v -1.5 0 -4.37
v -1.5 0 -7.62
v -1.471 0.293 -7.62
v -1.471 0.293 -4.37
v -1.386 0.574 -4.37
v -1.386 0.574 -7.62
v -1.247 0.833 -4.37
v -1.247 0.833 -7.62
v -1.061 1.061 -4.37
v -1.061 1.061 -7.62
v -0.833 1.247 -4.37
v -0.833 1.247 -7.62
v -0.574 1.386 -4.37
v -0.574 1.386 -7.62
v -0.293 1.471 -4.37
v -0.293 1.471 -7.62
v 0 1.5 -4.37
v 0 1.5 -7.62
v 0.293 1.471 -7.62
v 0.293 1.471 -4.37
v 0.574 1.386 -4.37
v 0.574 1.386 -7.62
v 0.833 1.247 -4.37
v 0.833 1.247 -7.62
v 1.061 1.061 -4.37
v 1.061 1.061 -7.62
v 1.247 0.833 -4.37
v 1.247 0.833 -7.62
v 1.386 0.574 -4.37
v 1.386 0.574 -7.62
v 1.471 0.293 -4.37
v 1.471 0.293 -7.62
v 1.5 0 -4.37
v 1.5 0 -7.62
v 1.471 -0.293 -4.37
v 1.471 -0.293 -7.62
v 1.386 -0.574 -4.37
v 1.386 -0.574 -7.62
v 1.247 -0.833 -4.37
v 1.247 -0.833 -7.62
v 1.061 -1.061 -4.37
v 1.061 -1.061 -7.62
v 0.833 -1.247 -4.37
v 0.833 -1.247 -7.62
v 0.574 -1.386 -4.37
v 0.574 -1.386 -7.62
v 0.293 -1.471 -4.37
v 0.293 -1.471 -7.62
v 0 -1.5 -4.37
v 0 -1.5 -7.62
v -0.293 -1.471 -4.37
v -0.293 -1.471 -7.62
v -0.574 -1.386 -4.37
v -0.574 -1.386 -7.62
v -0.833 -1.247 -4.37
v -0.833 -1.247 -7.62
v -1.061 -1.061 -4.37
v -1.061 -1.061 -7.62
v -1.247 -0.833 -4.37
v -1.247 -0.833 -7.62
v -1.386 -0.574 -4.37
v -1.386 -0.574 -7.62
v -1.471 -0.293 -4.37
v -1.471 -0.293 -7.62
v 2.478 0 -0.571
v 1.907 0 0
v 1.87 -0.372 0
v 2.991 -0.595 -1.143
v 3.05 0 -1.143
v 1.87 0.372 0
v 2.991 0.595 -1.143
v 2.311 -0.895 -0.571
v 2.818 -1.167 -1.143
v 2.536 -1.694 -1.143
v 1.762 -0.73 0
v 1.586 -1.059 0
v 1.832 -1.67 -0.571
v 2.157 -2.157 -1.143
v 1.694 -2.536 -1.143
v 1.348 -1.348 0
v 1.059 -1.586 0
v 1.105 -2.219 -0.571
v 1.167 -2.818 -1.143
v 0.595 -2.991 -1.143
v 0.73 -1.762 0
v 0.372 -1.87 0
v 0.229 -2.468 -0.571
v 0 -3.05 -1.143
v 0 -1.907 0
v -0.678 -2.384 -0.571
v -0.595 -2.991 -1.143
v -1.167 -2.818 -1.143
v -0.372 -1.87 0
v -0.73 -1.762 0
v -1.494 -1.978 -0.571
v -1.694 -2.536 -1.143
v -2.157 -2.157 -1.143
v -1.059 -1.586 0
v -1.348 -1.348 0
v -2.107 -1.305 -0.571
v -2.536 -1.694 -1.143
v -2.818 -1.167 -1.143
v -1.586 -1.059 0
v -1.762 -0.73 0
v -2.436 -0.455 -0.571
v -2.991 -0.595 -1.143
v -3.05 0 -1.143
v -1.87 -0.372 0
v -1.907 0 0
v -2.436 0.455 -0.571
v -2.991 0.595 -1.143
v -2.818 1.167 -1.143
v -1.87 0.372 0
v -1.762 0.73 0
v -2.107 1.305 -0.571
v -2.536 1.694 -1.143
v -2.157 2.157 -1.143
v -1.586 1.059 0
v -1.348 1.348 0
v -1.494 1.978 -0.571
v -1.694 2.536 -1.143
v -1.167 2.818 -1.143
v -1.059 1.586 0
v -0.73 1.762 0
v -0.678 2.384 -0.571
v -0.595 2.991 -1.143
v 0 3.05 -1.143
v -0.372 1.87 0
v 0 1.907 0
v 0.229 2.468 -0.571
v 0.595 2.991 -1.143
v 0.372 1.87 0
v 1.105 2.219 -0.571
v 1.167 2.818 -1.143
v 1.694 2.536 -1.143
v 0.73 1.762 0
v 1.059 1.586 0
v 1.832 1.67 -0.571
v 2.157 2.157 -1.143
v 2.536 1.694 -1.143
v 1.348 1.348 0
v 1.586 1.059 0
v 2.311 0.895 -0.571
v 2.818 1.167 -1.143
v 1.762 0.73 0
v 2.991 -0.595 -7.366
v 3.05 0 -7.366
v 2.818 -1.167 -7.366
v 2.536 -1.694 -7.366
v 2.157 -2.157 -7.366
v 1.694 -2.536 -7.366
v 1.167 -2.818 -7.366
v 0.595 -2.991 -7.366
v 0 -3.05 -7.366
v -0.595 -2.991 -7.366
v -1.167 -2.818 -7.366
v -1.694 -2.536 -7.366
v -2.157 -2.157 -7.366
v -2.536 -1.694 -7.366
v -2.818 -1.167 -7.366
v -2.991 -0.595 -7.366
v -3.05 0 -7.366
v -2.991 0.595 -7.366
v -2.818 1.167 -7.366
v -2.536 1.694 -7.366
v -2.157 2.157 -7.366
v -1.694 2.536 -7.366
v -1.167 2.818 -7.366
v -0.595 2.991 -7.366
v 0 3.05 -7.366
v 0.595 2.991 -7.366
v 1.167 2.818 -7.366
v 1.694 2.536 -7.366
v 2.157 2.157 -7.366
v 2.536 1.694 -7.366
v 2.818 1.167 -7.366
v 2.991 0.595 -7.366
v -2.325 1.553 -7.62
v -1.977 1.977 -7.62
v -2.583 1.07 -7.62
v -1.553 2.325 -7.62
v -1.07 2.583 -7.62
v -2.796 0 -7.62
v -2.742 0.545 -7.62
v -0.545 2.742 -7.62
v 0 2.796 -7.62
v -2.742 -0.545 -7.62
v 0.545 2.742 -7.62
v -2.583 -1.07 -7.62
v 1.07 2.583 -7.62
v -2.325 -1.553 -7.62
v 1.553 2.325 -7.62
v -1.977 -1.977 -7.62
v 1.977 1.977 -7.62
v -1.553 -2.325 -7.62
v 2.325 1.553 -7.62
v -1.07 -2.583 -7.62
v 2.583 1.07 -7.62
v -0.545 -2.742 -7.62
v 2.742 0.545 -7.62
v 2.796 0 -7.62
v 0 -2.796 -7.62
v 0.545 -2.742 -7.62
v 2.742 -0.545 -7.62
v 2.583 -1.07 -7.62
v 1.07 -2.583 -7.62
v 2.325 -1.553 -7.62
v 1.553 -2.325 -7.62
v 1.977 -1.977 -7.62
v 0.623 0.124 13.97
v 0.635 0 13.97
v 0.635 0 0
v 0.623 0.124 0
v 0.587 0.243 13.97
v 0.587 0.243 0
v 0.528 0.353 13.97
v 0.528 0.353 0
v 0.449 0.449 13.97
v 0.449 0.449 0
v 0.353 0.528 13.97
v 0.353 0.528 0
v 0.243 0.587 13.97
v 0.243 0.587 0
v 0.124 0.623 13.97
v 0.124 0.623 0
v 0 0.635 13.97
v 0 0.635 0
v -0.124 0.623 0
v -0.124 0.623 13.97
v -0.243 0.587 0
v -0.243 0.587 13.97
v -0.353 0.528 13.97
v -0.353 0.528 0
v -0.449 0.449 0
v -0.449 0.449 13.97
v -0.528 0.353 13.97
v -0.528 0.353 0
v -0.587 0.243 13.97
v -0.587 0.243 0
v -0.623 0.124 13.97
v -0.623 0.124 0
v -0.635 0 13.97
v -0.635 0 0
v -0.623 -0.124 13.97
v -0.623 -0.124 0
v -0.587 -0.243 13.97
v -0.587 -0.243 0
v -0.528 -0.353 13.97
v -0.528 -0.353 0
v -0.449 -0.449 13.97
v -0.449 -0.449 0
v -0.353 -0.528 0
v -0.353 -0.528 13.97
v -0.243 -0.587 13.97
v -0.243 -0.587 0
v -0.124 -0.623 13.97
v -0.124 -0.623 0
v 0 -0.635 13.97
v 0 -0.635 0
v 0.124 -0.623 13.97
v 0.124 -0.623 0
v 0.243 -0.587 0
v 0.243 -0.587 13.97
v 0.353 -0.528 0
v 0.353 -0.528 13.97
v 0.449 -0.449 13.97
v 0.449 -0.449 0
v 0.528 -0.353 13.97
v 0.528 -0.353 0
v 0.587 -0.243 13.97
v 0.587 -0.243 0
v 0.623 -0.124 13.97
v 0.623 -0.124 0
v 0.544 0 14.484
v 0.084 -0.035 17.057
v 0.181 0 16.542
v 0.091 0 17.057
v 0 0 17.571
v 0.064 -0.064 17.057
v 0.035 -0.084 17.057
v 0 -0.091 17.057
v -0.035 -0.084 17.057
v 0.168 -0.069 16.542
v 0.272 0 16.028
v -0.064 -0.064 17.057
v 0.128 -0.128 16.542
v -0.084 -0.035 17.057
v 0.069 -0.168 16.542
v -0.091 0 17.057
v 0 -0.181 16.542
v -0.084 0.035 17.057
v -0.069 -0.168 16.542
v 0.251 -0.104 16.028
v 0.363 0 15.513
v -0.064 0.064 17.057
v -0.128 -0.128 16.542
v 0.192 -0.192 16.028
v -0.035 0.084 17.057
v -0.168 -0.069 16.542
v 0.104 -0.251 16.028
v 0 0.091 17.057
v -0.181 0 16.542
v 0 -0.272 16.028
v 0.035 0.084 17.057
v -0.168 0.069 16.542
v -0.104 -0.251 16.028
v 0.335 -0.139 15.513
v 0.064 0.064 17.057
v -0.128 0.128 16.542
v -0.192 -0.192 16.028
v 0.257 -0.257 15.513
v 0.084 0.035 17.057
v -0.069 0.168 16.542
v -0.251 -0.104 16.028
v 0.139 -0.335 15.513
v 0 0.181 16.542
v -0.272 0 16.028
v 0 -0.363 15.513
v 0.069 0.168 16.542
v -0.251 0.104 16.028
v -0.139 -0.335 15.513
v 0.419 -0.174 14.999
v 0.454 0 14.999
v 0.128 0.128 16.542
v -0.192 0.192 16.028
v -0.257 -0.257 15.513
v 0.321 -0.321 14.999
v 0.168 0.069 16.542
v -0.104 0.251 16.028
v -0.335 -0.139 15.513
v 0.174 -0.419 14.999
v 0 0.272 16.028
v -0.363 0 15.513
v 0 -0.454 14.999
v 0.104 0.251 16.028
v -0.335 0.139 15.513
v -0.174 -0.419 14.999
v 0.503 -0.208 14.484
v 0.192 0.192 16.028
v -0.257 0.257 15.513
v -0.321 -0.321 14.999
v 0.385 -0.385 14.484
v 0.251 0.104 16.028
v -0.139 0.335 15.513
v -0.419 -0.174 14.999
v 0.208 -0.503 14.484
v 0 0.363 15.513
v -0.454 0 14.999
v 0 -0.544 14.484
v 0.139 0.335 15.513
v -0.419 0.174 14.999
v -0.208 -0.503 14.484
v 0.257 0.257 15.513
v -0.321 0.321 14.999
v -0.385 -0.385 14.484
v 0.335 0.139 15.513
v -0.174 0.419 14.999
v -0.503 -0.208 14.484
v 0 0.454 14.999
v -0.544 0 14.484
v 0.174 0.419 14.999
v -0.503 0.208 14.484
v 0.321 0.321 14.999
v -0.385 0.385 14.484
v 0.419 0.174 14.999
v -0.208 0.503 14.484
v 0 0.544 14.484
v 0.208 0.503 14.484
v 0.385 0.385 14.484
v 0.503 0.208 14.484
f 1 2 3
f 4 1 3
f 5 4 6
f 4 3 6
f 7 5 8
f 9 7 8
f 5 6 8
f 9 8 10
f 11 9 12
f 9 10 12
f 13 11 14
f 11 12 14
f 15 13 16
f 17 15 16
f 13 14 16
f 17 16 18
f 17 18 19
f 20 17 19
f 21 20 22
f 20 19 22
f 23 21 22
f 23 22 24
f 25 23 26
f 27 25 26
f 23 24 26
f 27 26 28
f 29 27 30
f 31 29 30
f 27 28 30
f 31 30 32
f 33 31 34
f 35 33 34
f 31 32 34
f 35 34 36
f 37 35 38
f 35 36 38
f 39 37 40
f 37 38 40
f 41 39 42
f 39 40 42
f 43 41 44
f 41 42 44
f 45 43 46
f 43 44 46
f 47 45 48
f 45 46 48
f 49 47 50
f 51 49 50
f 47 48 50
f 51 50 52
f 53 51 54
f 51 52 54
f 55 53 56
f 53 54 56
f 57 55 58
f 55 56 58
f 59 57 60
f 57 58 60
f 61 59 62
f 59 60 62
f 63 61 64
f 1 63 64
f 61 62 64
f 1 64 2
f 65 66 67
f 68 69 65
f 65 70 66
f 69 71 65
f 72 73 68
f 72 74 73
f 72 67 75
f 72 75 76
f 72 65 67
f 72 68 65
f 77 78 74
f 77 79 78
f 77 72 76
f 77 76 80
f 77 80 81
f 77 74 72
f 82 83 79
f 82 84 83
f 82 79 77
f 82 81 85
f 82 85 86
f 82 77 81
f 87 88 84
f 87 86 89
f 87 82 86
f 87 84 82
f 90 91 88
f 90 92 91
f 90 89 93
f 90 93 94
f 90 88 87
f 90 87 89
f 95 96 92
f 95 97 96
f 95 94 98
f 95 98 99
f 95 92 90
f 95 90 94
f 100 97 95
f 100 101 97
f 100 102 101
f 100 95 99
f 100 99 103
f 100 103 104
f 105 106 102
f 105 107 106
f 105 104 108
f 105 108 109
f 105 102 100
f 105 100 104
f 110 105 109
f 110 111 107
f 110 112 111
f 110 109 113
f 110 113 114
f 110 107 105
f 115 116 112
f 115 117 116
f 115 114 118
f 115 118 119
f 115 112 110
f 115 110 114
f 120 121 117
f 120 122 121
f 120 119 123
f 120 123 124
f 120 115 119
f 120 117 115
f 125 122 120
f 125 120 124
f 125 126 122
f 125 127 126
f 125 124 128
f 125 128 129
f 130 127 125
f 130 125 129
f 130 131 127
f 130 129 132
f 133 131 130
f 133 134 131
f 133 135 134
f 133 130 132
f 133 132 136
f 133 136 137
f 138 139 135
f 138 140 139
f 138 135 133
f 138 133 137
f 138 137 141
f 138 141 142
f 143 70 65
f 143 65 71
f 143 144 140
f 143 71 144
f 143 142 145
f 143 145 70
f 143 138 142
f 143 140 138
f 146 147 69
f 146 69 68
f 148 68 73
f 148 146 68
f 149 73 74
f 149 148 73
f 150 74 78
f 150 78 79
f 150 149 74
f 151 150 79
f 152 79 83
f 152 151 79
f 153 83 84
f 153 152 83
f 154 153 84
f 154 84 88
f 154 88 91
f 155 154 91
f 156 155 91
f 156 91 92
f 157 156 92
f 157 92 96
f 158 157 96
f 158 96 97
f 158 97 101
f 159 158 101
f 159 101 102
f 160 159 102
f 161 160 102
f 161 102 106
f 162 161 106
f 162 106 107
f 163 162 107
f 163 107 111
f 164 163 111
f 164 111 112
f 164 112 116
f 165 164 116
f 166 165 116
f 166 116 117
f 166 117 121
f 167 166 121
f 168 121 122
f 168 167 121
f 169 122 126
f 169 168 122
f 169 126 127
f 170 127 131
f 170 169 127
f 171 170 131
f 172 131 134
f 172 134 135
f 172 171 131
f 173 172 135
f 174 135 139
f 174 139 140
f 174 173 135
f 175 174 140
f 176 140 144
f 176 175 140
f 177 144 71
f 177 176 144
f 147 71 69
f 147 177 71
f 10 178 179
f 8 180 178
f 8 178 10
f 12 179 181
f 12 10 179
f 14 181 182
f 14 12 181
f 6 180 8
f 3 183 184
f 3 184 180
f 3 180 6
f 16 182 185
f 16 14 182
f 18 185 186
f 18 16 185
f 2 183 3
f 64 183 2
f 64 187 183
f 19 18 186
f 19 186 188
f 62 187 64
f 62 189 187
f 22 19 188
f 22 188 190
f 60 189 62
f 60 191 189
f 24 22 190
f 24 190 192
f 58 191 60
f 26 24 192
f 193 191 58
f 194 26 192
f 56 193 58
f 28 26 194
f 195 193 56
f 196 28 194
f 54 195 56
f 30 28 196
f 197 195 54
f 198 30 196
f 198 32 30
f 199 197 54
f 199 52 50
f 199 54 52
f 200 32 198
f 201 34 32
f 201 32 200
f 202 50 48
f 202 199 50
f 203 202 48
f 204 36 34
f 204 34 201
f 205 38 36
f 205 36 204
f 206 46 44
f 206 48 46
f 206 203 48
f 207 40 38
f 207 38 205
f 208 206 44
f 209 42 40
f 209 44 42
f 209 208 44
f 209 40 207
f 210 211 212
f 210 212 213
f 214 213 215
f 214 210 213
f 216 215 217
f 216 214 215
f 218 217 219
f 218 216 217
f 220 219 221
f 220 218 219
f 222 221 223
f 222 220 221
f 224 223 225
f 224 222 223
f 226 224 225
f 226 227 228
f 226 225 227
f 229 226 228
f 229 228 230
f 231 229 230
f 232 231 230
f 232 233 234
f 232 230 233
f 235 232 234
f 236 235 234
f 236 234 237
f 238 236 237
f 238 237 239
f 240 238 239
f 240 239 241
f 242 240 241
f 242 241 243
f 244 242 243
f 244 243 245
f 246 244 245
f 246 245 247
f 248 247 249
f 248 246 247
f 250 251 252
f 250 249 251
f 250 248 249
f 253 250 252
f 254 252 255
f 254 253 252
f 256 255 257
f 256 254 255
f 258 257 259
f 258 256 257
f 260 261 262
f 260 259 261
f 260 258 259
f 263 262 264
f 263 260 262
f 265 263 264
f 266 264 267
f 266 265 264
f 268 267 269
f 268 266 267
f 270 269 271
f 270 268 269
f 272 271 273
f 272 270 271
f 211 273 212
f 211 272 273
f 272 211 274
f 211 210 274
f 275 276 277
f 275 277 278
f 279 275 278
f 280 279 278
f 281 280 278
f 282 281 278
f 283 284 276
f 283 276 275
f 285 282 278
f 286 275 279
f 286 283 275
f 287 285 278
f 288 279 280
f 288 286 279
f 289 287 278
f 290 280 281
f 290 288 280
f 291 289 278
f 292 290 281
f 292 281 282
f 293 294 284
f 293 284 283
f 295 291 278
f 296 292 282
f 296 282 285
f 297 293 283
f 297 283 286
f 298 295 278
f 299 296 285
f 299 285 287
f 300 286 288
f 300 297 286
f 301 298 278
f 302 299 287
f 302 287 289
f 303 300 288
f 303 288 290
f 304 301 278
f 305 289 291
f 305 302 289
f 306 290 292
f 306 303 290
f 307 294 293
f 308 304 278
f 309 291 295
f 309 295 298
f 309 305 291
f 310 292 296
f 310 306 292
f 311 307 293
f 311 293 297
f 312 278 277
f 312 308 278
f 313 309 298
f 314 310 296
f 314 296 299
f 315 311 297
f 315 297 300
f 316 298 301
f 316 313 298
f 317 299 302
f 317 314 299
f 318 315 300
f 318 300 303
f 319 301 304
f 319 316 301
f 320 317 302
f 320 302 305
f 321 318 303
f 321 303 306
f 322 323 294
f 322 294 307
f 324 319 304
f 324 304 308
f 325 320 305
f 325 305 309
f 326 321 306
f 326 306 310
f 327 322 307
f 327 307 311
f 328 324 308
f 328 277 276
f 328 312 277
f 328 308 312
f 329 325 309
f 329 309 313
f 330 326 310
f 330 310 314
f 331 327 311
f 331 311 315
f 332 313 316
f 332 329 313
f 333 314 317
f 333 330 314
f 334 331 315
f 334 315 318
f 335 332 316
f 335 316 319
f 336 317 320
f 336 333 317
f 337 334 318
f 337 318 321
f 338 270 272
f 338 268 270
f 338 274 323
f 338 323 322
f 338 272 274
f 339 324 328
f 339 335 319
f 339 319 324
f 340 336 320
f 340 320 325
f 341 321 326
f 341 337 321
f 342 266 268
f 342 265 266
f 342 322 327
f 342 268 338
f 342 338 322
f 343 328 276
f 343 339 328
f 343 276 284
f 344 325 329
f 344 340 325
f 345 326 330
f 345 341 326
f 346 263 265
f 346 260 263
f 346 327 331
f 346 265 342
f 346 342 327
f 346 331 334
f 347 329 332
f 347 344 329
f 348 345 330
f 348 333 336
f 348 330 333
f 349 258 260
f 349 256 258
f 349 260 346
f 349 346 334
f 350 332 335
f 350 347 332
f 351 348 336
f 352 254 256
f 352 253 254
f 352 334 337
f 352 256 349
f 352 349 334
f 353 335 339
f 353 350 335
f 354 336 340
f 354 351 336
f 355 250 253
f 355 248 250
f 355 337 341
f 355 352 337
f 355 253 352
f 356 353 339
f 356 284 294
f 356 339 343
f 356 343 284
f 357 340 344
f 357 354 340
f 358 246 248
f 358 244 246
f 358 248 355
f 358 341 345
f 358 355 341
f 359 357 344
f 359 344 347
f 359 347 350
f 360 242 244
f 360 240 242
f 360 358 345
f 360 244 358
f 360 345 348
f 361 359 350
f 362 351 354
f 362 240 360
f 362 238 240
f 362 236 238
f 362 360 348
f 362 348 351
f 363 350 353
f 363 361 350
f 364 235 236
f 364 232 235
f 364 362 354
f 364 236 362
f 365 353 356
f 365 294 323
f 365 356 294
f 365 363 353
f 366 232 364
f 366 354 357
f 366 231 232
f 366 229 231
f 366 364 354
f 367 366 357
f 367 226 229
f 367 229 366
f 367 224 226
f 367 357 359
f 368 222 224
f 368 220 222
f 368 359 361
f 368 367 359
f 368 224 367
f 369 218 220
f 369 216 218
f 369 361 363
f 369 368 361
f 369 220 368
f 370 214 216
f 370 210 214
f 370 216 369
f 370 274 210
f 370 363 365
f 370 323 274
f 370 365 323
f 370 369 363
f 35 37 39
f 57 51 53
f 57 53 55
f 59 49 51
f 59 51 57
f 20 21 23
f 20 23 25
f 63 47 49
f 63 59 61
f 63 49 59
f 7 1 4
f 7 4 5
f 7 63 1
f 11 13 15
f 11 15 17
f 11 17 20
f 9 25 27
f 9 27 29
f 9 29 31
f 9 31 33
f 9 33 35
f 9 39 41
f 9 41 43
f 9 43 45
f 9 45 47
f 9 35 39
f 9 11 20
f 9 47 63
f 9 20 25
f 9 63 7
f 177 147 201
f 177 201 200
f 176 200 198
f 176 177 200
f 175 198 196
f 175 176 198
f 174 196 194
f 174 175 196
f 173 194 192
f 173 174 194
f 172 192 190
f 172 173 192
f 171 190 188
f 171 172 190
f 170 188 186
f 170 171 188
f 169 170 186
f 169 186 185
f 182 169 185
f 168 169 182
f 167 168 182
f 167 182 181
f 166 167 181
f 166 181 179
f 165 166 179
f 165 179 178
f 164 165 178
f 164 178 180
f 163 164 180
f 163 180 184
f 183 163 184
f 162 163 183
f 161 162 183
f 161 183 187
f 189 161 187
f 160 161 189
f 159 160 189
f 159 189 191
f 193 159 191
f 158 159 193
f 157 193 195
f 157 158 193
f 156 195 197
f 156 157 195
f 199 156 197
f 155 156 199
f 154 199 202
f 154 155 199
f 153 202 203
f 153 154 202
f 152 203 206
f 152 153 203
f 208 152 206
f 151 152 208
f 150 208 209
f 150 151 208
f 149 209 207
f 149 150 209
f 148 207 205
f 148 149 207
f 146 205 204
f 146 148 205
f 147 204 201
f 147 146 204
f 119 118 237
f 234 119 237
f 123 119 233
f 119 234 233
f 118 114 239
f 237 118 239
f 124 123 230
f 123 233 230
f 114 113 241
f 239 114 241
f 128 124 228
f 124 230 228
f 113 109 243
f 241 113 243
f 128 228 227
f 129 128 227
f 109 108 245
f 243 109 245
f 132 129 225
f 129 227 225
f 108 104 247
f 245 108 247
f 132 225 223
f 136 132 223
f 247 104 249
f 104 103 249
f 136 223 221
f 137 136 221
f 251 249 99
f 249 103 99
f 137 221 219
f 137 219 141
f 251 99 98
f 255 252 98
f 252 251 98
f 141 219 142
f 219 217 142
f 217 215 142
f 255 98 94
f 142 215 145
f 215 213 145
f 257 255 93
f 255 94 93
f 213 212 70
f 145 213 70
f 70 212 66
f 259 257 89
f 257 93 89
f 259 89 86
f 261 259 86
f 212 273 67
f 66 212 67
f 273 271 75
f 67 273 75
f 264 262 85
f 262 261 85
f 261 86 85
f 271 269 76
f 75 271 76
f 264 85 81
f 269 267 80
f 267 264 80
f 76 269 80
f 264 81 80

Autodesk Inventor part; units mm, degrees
ref_plane "YZ Plane" through (0, 0, 0) normal (1, 0, 0) x (0, 1, 0)
ref_plane "XZ Plane" through (0, 0, 0) normal (0, 1, 0) x (-1, 0, 0)
ref_plane "XY Plane" through (0, 0, 0) normal (0, 0, 1) x (1, 0, 0)
sketch "Sketch1" plane through (0, 0, 0) normal (0, 1, 0) x (-1, 0, 0)
  line L0 (0, 0) -> (-3.05, 0)
  line L1 (-3.05, 0) -> (-3.05, -7.62)
  line L2 (-3.05, -7.62) -> (0, -7.62)
  line L3 (0, -7.62) -> (0, 0)
  line L4 (0, 0) -> (-0.635, 0)
  line L5 (-0.635, 0) -> (-0.635, 13.97)
  line L6 (-0.635, 13.97) -> (0, 13.97)
  line L7 (0, 13.97) -> (0, 0)
  line L8 (-0.635, 13.97) -> (0, 17.5713)
  line L9 (-0.635, 13.97) -> (3.0218, 13.97) construction
  line L10 (0, 17.5713) -> (0, 13.97)
  dimension "d0" = 3.05
  dimension "d1" = 7.62
  dimension "d2" = 0.635
  dimension "d3" = 13.97
  dimension "d13" = 80
  dimension "d14" = 10
  dimension "d15" = 17.5713
  dimension "d16" = 25.1913
revolve "Revolution1" add sketch "Sketch1" angle 360 about axis through (0, 0, 13.97) along (0, 0, -1)
sketch "Sketch2" plane through (0, 0, -7.62) normal (0, 0, -1) x (-1, 0, 0)
  circle A0 centre (0, 0) radius 3.05 projected
  circle A1 centre (0, 0) radius 1.5
  dimension "d5" = 3
extrude "Extrusion1" cut sketch "Sketch2" against normal blind 3.25 contours A1
chamfer "Chamfer1" distance 1.143 angle 45 1 edges at (-3.05, 0, 0)
chamfer "Chamfer2" distance 0.254 angle 45 1 edges at (-3.05, 0, -7.62)
thread "Thread2" size "M3x0.5" class "6H" standard "ANSI Metric M Profile" full length
properties part number "carbide_probe_30deg_tip_r02" material "Steel, High Strength, Low Alloy"
